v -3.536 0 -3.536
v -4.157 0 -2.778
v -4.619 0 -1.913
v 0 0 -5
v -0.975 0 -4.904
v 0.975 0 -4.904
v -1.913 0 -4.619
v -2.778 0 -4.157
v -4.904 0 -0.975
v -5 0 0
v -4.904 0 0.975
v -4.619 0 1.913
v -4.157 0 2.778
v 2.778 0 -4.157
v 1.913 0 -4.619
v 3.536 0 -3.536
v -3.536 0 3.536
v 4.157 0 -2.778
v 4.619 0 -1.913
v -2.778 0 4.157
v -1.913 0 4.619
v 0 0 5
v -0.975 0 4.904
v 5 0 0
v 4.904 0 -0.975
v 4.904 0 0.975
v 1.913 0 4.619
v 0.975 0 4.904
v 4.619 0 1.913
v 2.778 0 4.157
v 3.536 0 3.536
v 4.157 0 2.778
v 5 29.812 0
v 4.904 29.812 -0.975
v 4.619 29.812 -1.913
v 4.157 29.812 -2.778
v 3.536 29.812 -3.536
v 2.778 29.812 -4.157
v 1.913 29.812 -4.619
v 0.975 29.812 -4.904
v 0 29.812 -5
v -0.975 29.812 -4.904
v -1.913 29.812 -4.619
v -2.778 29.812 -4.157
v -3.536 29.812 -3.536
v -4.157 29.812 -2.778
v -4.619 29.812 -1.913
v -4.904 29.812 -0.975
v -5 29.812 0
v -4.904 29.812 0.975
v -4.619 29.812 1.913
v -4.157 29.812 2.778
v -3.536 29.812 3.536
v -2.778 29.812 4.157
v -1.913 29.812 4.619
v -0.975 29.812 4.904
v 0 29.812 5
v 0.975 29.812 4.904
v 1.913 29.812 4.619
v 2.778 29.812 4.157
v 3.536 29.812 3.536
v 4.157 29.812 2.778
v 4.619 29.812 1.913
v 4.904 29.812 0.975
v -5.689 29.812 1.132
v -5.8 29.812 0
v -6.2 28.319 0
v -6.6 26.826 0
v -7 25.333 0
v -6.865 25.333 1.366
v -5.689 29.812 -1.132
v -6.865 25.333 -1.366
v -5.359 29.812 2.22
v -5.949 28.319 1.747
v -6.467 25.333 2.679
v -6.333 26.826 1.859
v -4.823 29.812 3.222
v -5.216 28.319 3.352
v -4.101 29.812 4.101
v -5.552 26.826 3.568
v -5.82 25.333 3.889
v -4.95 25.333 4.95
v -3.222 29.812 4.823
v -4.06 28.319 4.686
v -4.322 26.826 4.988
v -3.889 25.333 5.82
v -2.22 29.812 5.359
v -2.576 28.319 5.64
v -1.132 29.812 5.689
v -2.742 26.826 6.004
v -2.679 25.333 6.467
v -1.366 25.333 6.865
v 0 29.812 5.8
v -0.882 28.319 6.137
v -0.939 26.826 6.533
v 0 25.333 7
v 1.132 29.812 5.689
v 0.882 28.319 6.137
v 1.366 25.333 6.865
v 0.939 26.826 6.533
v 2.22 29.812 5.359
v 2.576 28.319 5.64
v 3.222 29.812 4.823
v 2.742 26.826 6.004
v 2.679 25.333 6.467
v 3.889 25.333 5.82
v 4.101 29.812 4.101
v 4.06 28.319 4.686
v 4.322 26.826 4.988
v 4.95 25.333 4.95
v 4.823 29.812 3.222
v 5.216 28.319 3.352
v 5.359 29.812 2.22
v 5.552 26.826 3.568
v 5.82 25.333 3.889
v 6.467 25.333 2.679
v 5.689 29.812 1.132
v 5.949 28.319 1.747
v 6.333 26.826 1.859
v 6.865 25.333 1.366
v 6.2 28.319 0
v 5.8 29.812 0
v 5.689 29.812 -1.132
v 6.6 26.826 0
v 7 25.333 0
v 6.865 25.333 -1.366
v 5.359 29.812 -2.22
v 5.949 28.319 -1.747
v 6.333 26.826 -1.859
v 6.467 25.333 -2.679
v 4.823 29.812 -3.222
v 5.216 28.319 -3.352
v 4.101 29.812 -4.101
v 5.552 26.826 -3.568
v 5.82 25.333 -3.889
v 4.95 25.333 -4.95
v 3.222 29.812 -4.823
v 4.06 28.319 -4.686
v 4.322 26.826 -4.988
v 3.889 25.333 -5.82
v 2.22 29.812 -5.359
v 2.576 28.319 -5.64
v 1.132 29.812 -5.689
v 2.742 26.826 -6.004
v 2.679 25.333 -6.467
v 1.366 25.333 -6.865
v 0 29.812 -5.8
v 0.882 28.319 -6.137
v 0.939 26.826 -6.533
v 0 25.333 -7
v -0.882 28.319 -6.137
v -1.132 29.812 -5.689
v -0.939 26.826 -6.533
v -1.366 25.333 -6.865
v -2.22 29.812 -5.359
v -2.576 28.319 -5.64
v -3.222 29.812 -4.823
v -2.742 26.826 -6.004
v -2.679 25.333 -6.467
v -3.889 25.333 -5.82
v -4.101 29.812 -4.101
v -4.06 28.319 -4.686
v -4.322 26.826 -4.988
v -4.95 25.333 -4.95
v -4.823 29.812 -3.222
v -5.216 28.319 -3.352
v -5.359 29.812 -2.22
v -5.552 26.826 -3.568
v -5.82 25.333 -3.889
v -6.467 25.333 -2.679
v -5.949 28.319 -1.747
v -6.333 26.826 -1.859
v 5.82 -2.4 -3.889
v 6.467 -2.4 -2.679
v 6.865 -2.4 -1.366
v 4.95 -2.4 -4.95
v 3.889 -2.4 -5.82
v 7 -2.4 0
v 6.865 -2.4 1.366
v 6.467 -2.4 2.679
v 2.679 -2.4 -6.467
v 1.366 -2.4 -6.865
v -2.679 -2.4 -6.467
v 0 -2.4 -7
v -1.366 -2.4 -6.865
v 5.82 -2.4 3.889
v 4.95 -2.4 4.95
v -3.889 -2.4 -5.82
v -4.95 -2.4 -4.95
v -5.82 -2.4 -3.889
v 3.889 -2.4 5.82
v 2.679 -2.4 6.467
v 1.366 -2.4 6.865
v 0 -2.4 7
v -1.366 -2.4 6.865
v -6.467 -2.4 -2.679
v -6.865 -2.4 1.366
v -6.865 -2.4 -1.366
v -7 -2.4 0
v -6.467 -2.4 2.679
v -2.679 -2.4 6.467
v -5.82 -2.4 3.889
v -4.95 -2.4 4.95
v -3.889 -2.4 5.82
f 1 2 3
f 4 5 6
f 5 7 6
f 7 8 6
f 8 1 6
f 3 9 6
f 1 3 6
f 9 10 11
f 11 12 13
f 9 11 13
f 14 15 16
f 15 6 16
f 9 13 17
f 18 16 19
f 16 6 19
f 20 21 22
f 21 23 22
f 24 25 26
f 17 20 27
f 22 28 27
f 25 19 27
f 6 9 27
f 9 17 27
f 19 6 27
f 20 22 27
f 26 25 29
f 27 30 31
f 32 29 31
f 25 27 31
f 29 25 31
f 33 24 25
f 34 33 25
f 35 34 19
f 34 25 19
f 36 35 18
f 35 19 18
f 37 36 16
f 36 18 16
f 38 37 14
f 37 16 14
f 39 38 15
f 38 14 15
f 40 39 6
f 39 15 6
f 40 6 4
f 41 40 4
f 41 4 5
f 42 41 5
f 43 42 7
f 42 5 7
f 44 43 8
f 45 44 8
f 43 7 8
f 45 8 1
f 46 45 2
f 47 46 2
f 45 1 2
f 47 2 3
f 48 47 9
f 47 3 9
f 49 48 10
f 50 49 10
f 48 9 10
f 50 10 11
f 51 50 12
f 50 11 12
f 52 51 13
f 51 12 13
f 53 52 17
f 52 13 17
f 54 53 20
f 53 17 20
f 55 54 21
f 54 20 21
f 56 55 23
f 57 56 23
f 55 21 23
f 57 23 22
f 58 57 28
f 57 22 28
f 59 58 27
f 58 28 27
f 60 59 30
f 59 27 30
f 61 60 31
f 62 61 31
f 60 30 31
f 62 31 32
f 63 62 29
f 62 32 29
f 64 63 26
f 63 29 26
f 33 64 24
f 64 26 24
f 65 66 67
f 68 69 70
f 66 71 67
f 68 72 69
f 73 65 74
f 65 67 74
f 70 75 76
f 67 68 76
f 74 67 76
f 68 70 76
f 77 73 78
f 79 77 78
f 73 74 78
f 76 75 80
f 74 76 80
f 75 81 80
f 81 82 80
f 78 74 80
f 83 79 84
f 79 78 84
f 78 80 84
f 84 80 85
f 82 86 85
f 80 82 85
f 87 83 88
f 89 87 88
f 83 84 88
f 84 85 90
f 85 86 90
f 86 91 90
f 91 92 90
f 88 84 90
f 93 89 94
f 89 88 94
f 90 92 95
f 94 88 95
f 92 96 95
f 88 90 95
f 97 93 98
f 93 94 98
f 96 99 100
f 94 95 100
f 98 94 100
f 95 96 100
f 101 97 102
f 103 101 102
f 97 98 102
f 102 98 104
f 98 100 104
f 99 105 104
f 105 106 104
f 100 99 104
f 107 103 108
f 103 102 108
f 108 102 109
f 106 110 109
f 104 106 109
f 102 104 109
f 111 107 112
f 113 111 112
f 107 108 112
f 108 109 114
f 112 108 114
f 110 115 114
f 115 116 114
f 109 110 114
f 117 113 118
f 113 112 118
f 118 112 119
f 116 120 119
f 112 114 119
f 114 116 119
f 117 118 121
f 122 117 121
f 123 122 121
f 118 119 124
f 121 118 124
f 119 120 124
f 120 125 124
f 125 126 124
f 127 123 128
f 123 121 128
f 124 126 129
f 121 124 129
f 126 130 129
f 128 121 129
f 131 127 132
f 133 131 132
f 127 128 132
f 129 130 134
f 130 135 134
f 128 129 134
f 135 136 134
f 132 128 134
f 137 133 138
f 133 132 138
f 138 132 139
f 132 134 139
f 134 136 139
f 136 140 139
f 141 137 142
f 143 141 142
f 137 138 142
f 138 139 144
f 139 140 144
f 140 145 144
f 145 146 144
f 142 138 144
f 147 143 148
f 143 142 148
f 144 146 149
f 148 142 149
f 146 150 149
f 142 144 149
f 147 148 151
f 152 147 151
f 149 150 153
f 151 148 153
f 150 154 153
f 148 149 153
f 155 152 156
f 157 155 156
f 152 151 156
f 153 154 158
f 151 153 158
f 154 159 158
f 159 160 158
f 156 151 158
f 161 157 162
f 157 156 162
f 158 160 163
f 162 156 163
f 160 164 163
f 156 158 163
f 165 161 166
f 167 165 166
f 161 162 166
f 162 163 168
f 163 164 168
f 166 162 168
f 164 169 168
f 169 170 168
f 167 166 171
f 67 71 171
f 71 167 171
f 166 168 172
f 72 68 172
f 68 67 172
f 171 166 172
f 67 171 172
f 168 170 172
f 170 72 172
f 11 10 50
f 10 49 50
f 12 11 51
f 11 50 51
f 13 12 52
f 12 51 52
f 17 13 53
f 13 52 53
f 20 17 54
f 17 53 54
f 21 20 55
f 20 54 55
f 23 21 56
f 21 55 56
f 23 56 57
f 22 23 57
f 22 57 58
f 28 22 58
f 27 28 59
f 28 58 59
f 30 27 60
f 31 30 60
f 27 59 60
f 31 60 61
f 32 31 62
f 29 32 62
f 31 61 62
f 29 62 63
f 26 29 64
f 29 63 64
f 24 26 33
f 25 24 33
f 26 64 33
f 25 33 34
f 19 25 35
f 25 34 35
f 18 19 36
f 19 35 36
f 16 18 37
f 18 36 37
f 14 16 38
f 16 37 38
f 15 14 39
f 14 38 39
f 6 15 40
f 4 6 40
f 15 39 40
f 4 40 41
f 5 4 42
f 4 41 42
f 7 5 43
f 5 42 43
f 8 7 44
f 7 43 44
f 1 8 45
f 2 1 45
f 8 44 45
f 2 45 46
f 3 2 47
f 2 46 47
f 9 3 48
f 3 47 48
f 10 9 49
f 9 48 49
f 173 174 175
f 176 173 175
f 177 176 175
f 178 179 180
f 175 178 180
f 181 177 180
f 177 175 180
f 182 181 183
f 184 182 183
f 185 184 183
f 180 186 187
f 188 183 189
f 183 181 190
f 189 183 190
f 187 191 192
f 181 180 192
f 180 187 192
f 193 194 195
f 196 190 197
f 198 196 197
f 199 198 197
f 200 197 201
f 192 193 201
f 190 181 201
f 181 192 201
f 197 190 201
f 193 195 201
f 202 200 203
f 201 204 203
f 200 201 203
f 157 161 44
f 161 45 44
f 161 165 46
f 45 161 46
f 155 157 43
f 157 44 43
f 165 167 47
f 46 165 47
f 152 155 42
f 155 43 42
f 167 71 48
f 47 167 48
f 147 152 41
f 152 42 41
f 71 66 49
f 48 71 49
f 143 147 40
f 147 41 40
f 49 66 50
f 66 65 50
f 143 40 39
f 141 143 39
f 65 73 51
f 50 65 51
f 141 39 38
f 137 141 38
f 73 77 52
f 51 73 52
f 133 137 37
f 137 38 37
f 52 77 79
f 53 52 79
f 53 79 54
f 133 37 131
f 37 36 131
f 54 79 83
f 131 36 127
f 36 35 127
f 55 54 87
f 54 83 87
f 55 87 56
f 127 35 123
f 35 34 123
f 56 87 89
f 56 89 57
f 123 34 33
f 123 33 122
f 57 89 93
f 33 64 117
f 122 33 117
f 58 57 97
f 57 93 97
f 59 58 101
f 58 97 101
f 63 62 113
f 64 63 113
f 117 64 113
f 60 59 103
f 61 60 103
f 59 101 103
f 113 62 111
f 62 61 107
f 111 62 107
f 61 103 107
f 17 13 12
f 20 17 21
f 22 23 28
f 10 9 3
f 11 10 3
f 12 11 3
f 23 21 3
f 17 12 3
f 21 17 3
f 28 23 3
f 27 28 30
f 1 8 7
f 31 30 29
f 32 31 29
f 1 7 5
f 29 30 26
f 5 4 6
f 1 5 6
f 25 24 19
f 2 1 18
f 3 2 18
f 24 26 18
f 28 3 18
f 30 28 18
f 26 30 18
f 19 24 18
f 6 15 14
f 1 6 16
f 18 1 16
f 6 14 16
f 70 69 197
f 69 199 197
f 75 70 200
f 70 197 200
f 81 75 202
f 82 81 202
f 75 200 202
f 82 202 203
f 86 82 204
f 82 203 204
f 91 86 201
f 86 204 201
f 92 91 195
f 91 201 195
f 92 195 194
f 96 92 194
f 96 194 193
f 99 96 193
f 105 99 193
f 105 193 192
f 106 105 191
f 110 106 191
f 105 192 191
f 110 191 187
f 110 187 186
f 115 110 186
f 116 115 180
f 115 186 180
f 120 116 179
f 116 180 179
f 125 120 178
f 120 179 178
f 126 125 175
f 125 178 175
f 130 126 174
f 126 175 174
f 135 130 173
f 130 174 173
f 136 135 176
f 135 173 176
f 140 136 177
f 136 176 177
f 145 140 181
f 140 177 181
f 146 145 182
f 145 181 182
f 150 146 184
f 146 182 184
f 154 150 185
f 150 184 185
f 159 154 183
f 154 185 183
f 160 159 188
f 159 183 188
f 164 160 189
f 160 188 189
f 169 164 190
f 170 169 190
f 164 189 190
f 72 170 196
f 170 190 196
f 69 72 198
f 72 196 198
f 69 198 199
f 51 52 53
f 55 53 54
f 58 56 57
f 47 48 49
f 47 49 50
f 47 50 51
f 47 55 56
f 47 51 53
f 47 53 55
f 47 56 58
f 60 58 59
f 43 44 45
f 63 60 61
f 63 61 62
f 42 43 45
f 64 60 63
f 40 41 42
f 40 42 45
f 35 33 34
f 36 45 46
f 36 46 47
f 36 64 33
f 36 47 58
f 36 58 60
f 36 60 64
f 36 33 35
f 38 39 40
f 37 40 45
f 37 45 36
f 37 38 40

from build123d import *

# Parameters (mm, degrees)
SKETCH1_R           = 5
BOSS_EXTRUDE1_DEPTH = 29.81174009


with BuildPart() as part:
    # Sketch1 → Boss-Extrude1 (new body)
    with BuildSketch(Plane(origin=(0, 0, 0), x_dir=(1, 0, 0), z_dir=(0, 1, 0))):
        Circle(SKETCH1_R)
    extrude(amount=BOSS_EXTRUDE1_DEPTH)


with BuildPart() as body_2:
    # Sketch2 → Revolve1 (revolve)
    with BuildSketch(Plane.XY):
        Polygon((0, 0), (-5, 0), (-5, 29.81174009), (-5.8, 29.81174009), (-7, 25.333279121), (-7, -2.4), (0, -2.4), align=None)
    revolve(axis=Axis((0, 0, 0), (0, 1, 0)))


solid = Compound([part.part, body_2.part])
